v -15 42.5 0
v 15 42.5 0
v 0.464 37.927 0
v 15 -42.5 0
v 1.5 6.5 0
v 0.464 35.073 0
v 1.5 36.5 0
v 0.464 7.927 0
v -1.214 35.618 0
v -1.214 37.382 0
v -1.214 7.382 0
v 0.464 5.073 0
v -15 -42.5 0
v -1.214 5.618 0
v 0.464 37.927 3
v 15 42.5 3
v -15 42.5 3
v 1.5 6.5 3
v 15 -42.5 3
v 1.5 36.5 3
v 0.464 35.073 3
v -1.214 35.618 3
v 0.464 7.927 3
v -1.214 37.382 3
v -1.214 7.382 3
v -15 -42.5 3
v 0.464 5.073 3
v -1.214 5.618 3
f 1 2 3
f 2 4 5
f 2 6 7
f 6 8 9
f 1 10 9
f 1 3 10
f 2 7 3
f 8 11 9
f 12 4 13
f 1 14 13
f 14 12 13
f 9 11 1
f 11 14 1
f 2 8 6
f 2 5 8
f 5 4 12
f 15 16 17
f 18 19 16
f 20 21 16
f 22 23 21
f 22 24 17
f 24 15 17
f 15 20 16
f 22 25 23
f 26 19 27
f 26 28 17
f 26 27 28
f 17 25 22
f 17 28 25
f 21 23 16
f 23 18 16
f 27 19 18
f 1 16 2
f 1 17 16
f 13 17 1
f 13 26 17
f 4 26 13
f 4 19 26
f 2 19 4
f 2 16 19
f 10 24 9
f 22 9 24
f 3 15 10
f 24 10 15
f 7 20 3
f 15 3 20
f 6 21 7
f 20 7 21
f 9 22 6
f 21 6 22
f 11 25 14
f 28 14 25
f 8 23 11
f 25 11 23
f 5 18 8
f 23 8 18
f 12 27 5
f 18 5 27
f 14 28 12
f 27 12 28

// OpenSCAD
linear_extrude(3) {
  difference() {
    square([30, 85], center = true);

    translate([0, (85 / 2) - 6]) {
      circle(d = 3, $fn = 5);
      translate([0, -30]) {
        circle(d = 3, $fn = 5);
      }
    }
  }
}
